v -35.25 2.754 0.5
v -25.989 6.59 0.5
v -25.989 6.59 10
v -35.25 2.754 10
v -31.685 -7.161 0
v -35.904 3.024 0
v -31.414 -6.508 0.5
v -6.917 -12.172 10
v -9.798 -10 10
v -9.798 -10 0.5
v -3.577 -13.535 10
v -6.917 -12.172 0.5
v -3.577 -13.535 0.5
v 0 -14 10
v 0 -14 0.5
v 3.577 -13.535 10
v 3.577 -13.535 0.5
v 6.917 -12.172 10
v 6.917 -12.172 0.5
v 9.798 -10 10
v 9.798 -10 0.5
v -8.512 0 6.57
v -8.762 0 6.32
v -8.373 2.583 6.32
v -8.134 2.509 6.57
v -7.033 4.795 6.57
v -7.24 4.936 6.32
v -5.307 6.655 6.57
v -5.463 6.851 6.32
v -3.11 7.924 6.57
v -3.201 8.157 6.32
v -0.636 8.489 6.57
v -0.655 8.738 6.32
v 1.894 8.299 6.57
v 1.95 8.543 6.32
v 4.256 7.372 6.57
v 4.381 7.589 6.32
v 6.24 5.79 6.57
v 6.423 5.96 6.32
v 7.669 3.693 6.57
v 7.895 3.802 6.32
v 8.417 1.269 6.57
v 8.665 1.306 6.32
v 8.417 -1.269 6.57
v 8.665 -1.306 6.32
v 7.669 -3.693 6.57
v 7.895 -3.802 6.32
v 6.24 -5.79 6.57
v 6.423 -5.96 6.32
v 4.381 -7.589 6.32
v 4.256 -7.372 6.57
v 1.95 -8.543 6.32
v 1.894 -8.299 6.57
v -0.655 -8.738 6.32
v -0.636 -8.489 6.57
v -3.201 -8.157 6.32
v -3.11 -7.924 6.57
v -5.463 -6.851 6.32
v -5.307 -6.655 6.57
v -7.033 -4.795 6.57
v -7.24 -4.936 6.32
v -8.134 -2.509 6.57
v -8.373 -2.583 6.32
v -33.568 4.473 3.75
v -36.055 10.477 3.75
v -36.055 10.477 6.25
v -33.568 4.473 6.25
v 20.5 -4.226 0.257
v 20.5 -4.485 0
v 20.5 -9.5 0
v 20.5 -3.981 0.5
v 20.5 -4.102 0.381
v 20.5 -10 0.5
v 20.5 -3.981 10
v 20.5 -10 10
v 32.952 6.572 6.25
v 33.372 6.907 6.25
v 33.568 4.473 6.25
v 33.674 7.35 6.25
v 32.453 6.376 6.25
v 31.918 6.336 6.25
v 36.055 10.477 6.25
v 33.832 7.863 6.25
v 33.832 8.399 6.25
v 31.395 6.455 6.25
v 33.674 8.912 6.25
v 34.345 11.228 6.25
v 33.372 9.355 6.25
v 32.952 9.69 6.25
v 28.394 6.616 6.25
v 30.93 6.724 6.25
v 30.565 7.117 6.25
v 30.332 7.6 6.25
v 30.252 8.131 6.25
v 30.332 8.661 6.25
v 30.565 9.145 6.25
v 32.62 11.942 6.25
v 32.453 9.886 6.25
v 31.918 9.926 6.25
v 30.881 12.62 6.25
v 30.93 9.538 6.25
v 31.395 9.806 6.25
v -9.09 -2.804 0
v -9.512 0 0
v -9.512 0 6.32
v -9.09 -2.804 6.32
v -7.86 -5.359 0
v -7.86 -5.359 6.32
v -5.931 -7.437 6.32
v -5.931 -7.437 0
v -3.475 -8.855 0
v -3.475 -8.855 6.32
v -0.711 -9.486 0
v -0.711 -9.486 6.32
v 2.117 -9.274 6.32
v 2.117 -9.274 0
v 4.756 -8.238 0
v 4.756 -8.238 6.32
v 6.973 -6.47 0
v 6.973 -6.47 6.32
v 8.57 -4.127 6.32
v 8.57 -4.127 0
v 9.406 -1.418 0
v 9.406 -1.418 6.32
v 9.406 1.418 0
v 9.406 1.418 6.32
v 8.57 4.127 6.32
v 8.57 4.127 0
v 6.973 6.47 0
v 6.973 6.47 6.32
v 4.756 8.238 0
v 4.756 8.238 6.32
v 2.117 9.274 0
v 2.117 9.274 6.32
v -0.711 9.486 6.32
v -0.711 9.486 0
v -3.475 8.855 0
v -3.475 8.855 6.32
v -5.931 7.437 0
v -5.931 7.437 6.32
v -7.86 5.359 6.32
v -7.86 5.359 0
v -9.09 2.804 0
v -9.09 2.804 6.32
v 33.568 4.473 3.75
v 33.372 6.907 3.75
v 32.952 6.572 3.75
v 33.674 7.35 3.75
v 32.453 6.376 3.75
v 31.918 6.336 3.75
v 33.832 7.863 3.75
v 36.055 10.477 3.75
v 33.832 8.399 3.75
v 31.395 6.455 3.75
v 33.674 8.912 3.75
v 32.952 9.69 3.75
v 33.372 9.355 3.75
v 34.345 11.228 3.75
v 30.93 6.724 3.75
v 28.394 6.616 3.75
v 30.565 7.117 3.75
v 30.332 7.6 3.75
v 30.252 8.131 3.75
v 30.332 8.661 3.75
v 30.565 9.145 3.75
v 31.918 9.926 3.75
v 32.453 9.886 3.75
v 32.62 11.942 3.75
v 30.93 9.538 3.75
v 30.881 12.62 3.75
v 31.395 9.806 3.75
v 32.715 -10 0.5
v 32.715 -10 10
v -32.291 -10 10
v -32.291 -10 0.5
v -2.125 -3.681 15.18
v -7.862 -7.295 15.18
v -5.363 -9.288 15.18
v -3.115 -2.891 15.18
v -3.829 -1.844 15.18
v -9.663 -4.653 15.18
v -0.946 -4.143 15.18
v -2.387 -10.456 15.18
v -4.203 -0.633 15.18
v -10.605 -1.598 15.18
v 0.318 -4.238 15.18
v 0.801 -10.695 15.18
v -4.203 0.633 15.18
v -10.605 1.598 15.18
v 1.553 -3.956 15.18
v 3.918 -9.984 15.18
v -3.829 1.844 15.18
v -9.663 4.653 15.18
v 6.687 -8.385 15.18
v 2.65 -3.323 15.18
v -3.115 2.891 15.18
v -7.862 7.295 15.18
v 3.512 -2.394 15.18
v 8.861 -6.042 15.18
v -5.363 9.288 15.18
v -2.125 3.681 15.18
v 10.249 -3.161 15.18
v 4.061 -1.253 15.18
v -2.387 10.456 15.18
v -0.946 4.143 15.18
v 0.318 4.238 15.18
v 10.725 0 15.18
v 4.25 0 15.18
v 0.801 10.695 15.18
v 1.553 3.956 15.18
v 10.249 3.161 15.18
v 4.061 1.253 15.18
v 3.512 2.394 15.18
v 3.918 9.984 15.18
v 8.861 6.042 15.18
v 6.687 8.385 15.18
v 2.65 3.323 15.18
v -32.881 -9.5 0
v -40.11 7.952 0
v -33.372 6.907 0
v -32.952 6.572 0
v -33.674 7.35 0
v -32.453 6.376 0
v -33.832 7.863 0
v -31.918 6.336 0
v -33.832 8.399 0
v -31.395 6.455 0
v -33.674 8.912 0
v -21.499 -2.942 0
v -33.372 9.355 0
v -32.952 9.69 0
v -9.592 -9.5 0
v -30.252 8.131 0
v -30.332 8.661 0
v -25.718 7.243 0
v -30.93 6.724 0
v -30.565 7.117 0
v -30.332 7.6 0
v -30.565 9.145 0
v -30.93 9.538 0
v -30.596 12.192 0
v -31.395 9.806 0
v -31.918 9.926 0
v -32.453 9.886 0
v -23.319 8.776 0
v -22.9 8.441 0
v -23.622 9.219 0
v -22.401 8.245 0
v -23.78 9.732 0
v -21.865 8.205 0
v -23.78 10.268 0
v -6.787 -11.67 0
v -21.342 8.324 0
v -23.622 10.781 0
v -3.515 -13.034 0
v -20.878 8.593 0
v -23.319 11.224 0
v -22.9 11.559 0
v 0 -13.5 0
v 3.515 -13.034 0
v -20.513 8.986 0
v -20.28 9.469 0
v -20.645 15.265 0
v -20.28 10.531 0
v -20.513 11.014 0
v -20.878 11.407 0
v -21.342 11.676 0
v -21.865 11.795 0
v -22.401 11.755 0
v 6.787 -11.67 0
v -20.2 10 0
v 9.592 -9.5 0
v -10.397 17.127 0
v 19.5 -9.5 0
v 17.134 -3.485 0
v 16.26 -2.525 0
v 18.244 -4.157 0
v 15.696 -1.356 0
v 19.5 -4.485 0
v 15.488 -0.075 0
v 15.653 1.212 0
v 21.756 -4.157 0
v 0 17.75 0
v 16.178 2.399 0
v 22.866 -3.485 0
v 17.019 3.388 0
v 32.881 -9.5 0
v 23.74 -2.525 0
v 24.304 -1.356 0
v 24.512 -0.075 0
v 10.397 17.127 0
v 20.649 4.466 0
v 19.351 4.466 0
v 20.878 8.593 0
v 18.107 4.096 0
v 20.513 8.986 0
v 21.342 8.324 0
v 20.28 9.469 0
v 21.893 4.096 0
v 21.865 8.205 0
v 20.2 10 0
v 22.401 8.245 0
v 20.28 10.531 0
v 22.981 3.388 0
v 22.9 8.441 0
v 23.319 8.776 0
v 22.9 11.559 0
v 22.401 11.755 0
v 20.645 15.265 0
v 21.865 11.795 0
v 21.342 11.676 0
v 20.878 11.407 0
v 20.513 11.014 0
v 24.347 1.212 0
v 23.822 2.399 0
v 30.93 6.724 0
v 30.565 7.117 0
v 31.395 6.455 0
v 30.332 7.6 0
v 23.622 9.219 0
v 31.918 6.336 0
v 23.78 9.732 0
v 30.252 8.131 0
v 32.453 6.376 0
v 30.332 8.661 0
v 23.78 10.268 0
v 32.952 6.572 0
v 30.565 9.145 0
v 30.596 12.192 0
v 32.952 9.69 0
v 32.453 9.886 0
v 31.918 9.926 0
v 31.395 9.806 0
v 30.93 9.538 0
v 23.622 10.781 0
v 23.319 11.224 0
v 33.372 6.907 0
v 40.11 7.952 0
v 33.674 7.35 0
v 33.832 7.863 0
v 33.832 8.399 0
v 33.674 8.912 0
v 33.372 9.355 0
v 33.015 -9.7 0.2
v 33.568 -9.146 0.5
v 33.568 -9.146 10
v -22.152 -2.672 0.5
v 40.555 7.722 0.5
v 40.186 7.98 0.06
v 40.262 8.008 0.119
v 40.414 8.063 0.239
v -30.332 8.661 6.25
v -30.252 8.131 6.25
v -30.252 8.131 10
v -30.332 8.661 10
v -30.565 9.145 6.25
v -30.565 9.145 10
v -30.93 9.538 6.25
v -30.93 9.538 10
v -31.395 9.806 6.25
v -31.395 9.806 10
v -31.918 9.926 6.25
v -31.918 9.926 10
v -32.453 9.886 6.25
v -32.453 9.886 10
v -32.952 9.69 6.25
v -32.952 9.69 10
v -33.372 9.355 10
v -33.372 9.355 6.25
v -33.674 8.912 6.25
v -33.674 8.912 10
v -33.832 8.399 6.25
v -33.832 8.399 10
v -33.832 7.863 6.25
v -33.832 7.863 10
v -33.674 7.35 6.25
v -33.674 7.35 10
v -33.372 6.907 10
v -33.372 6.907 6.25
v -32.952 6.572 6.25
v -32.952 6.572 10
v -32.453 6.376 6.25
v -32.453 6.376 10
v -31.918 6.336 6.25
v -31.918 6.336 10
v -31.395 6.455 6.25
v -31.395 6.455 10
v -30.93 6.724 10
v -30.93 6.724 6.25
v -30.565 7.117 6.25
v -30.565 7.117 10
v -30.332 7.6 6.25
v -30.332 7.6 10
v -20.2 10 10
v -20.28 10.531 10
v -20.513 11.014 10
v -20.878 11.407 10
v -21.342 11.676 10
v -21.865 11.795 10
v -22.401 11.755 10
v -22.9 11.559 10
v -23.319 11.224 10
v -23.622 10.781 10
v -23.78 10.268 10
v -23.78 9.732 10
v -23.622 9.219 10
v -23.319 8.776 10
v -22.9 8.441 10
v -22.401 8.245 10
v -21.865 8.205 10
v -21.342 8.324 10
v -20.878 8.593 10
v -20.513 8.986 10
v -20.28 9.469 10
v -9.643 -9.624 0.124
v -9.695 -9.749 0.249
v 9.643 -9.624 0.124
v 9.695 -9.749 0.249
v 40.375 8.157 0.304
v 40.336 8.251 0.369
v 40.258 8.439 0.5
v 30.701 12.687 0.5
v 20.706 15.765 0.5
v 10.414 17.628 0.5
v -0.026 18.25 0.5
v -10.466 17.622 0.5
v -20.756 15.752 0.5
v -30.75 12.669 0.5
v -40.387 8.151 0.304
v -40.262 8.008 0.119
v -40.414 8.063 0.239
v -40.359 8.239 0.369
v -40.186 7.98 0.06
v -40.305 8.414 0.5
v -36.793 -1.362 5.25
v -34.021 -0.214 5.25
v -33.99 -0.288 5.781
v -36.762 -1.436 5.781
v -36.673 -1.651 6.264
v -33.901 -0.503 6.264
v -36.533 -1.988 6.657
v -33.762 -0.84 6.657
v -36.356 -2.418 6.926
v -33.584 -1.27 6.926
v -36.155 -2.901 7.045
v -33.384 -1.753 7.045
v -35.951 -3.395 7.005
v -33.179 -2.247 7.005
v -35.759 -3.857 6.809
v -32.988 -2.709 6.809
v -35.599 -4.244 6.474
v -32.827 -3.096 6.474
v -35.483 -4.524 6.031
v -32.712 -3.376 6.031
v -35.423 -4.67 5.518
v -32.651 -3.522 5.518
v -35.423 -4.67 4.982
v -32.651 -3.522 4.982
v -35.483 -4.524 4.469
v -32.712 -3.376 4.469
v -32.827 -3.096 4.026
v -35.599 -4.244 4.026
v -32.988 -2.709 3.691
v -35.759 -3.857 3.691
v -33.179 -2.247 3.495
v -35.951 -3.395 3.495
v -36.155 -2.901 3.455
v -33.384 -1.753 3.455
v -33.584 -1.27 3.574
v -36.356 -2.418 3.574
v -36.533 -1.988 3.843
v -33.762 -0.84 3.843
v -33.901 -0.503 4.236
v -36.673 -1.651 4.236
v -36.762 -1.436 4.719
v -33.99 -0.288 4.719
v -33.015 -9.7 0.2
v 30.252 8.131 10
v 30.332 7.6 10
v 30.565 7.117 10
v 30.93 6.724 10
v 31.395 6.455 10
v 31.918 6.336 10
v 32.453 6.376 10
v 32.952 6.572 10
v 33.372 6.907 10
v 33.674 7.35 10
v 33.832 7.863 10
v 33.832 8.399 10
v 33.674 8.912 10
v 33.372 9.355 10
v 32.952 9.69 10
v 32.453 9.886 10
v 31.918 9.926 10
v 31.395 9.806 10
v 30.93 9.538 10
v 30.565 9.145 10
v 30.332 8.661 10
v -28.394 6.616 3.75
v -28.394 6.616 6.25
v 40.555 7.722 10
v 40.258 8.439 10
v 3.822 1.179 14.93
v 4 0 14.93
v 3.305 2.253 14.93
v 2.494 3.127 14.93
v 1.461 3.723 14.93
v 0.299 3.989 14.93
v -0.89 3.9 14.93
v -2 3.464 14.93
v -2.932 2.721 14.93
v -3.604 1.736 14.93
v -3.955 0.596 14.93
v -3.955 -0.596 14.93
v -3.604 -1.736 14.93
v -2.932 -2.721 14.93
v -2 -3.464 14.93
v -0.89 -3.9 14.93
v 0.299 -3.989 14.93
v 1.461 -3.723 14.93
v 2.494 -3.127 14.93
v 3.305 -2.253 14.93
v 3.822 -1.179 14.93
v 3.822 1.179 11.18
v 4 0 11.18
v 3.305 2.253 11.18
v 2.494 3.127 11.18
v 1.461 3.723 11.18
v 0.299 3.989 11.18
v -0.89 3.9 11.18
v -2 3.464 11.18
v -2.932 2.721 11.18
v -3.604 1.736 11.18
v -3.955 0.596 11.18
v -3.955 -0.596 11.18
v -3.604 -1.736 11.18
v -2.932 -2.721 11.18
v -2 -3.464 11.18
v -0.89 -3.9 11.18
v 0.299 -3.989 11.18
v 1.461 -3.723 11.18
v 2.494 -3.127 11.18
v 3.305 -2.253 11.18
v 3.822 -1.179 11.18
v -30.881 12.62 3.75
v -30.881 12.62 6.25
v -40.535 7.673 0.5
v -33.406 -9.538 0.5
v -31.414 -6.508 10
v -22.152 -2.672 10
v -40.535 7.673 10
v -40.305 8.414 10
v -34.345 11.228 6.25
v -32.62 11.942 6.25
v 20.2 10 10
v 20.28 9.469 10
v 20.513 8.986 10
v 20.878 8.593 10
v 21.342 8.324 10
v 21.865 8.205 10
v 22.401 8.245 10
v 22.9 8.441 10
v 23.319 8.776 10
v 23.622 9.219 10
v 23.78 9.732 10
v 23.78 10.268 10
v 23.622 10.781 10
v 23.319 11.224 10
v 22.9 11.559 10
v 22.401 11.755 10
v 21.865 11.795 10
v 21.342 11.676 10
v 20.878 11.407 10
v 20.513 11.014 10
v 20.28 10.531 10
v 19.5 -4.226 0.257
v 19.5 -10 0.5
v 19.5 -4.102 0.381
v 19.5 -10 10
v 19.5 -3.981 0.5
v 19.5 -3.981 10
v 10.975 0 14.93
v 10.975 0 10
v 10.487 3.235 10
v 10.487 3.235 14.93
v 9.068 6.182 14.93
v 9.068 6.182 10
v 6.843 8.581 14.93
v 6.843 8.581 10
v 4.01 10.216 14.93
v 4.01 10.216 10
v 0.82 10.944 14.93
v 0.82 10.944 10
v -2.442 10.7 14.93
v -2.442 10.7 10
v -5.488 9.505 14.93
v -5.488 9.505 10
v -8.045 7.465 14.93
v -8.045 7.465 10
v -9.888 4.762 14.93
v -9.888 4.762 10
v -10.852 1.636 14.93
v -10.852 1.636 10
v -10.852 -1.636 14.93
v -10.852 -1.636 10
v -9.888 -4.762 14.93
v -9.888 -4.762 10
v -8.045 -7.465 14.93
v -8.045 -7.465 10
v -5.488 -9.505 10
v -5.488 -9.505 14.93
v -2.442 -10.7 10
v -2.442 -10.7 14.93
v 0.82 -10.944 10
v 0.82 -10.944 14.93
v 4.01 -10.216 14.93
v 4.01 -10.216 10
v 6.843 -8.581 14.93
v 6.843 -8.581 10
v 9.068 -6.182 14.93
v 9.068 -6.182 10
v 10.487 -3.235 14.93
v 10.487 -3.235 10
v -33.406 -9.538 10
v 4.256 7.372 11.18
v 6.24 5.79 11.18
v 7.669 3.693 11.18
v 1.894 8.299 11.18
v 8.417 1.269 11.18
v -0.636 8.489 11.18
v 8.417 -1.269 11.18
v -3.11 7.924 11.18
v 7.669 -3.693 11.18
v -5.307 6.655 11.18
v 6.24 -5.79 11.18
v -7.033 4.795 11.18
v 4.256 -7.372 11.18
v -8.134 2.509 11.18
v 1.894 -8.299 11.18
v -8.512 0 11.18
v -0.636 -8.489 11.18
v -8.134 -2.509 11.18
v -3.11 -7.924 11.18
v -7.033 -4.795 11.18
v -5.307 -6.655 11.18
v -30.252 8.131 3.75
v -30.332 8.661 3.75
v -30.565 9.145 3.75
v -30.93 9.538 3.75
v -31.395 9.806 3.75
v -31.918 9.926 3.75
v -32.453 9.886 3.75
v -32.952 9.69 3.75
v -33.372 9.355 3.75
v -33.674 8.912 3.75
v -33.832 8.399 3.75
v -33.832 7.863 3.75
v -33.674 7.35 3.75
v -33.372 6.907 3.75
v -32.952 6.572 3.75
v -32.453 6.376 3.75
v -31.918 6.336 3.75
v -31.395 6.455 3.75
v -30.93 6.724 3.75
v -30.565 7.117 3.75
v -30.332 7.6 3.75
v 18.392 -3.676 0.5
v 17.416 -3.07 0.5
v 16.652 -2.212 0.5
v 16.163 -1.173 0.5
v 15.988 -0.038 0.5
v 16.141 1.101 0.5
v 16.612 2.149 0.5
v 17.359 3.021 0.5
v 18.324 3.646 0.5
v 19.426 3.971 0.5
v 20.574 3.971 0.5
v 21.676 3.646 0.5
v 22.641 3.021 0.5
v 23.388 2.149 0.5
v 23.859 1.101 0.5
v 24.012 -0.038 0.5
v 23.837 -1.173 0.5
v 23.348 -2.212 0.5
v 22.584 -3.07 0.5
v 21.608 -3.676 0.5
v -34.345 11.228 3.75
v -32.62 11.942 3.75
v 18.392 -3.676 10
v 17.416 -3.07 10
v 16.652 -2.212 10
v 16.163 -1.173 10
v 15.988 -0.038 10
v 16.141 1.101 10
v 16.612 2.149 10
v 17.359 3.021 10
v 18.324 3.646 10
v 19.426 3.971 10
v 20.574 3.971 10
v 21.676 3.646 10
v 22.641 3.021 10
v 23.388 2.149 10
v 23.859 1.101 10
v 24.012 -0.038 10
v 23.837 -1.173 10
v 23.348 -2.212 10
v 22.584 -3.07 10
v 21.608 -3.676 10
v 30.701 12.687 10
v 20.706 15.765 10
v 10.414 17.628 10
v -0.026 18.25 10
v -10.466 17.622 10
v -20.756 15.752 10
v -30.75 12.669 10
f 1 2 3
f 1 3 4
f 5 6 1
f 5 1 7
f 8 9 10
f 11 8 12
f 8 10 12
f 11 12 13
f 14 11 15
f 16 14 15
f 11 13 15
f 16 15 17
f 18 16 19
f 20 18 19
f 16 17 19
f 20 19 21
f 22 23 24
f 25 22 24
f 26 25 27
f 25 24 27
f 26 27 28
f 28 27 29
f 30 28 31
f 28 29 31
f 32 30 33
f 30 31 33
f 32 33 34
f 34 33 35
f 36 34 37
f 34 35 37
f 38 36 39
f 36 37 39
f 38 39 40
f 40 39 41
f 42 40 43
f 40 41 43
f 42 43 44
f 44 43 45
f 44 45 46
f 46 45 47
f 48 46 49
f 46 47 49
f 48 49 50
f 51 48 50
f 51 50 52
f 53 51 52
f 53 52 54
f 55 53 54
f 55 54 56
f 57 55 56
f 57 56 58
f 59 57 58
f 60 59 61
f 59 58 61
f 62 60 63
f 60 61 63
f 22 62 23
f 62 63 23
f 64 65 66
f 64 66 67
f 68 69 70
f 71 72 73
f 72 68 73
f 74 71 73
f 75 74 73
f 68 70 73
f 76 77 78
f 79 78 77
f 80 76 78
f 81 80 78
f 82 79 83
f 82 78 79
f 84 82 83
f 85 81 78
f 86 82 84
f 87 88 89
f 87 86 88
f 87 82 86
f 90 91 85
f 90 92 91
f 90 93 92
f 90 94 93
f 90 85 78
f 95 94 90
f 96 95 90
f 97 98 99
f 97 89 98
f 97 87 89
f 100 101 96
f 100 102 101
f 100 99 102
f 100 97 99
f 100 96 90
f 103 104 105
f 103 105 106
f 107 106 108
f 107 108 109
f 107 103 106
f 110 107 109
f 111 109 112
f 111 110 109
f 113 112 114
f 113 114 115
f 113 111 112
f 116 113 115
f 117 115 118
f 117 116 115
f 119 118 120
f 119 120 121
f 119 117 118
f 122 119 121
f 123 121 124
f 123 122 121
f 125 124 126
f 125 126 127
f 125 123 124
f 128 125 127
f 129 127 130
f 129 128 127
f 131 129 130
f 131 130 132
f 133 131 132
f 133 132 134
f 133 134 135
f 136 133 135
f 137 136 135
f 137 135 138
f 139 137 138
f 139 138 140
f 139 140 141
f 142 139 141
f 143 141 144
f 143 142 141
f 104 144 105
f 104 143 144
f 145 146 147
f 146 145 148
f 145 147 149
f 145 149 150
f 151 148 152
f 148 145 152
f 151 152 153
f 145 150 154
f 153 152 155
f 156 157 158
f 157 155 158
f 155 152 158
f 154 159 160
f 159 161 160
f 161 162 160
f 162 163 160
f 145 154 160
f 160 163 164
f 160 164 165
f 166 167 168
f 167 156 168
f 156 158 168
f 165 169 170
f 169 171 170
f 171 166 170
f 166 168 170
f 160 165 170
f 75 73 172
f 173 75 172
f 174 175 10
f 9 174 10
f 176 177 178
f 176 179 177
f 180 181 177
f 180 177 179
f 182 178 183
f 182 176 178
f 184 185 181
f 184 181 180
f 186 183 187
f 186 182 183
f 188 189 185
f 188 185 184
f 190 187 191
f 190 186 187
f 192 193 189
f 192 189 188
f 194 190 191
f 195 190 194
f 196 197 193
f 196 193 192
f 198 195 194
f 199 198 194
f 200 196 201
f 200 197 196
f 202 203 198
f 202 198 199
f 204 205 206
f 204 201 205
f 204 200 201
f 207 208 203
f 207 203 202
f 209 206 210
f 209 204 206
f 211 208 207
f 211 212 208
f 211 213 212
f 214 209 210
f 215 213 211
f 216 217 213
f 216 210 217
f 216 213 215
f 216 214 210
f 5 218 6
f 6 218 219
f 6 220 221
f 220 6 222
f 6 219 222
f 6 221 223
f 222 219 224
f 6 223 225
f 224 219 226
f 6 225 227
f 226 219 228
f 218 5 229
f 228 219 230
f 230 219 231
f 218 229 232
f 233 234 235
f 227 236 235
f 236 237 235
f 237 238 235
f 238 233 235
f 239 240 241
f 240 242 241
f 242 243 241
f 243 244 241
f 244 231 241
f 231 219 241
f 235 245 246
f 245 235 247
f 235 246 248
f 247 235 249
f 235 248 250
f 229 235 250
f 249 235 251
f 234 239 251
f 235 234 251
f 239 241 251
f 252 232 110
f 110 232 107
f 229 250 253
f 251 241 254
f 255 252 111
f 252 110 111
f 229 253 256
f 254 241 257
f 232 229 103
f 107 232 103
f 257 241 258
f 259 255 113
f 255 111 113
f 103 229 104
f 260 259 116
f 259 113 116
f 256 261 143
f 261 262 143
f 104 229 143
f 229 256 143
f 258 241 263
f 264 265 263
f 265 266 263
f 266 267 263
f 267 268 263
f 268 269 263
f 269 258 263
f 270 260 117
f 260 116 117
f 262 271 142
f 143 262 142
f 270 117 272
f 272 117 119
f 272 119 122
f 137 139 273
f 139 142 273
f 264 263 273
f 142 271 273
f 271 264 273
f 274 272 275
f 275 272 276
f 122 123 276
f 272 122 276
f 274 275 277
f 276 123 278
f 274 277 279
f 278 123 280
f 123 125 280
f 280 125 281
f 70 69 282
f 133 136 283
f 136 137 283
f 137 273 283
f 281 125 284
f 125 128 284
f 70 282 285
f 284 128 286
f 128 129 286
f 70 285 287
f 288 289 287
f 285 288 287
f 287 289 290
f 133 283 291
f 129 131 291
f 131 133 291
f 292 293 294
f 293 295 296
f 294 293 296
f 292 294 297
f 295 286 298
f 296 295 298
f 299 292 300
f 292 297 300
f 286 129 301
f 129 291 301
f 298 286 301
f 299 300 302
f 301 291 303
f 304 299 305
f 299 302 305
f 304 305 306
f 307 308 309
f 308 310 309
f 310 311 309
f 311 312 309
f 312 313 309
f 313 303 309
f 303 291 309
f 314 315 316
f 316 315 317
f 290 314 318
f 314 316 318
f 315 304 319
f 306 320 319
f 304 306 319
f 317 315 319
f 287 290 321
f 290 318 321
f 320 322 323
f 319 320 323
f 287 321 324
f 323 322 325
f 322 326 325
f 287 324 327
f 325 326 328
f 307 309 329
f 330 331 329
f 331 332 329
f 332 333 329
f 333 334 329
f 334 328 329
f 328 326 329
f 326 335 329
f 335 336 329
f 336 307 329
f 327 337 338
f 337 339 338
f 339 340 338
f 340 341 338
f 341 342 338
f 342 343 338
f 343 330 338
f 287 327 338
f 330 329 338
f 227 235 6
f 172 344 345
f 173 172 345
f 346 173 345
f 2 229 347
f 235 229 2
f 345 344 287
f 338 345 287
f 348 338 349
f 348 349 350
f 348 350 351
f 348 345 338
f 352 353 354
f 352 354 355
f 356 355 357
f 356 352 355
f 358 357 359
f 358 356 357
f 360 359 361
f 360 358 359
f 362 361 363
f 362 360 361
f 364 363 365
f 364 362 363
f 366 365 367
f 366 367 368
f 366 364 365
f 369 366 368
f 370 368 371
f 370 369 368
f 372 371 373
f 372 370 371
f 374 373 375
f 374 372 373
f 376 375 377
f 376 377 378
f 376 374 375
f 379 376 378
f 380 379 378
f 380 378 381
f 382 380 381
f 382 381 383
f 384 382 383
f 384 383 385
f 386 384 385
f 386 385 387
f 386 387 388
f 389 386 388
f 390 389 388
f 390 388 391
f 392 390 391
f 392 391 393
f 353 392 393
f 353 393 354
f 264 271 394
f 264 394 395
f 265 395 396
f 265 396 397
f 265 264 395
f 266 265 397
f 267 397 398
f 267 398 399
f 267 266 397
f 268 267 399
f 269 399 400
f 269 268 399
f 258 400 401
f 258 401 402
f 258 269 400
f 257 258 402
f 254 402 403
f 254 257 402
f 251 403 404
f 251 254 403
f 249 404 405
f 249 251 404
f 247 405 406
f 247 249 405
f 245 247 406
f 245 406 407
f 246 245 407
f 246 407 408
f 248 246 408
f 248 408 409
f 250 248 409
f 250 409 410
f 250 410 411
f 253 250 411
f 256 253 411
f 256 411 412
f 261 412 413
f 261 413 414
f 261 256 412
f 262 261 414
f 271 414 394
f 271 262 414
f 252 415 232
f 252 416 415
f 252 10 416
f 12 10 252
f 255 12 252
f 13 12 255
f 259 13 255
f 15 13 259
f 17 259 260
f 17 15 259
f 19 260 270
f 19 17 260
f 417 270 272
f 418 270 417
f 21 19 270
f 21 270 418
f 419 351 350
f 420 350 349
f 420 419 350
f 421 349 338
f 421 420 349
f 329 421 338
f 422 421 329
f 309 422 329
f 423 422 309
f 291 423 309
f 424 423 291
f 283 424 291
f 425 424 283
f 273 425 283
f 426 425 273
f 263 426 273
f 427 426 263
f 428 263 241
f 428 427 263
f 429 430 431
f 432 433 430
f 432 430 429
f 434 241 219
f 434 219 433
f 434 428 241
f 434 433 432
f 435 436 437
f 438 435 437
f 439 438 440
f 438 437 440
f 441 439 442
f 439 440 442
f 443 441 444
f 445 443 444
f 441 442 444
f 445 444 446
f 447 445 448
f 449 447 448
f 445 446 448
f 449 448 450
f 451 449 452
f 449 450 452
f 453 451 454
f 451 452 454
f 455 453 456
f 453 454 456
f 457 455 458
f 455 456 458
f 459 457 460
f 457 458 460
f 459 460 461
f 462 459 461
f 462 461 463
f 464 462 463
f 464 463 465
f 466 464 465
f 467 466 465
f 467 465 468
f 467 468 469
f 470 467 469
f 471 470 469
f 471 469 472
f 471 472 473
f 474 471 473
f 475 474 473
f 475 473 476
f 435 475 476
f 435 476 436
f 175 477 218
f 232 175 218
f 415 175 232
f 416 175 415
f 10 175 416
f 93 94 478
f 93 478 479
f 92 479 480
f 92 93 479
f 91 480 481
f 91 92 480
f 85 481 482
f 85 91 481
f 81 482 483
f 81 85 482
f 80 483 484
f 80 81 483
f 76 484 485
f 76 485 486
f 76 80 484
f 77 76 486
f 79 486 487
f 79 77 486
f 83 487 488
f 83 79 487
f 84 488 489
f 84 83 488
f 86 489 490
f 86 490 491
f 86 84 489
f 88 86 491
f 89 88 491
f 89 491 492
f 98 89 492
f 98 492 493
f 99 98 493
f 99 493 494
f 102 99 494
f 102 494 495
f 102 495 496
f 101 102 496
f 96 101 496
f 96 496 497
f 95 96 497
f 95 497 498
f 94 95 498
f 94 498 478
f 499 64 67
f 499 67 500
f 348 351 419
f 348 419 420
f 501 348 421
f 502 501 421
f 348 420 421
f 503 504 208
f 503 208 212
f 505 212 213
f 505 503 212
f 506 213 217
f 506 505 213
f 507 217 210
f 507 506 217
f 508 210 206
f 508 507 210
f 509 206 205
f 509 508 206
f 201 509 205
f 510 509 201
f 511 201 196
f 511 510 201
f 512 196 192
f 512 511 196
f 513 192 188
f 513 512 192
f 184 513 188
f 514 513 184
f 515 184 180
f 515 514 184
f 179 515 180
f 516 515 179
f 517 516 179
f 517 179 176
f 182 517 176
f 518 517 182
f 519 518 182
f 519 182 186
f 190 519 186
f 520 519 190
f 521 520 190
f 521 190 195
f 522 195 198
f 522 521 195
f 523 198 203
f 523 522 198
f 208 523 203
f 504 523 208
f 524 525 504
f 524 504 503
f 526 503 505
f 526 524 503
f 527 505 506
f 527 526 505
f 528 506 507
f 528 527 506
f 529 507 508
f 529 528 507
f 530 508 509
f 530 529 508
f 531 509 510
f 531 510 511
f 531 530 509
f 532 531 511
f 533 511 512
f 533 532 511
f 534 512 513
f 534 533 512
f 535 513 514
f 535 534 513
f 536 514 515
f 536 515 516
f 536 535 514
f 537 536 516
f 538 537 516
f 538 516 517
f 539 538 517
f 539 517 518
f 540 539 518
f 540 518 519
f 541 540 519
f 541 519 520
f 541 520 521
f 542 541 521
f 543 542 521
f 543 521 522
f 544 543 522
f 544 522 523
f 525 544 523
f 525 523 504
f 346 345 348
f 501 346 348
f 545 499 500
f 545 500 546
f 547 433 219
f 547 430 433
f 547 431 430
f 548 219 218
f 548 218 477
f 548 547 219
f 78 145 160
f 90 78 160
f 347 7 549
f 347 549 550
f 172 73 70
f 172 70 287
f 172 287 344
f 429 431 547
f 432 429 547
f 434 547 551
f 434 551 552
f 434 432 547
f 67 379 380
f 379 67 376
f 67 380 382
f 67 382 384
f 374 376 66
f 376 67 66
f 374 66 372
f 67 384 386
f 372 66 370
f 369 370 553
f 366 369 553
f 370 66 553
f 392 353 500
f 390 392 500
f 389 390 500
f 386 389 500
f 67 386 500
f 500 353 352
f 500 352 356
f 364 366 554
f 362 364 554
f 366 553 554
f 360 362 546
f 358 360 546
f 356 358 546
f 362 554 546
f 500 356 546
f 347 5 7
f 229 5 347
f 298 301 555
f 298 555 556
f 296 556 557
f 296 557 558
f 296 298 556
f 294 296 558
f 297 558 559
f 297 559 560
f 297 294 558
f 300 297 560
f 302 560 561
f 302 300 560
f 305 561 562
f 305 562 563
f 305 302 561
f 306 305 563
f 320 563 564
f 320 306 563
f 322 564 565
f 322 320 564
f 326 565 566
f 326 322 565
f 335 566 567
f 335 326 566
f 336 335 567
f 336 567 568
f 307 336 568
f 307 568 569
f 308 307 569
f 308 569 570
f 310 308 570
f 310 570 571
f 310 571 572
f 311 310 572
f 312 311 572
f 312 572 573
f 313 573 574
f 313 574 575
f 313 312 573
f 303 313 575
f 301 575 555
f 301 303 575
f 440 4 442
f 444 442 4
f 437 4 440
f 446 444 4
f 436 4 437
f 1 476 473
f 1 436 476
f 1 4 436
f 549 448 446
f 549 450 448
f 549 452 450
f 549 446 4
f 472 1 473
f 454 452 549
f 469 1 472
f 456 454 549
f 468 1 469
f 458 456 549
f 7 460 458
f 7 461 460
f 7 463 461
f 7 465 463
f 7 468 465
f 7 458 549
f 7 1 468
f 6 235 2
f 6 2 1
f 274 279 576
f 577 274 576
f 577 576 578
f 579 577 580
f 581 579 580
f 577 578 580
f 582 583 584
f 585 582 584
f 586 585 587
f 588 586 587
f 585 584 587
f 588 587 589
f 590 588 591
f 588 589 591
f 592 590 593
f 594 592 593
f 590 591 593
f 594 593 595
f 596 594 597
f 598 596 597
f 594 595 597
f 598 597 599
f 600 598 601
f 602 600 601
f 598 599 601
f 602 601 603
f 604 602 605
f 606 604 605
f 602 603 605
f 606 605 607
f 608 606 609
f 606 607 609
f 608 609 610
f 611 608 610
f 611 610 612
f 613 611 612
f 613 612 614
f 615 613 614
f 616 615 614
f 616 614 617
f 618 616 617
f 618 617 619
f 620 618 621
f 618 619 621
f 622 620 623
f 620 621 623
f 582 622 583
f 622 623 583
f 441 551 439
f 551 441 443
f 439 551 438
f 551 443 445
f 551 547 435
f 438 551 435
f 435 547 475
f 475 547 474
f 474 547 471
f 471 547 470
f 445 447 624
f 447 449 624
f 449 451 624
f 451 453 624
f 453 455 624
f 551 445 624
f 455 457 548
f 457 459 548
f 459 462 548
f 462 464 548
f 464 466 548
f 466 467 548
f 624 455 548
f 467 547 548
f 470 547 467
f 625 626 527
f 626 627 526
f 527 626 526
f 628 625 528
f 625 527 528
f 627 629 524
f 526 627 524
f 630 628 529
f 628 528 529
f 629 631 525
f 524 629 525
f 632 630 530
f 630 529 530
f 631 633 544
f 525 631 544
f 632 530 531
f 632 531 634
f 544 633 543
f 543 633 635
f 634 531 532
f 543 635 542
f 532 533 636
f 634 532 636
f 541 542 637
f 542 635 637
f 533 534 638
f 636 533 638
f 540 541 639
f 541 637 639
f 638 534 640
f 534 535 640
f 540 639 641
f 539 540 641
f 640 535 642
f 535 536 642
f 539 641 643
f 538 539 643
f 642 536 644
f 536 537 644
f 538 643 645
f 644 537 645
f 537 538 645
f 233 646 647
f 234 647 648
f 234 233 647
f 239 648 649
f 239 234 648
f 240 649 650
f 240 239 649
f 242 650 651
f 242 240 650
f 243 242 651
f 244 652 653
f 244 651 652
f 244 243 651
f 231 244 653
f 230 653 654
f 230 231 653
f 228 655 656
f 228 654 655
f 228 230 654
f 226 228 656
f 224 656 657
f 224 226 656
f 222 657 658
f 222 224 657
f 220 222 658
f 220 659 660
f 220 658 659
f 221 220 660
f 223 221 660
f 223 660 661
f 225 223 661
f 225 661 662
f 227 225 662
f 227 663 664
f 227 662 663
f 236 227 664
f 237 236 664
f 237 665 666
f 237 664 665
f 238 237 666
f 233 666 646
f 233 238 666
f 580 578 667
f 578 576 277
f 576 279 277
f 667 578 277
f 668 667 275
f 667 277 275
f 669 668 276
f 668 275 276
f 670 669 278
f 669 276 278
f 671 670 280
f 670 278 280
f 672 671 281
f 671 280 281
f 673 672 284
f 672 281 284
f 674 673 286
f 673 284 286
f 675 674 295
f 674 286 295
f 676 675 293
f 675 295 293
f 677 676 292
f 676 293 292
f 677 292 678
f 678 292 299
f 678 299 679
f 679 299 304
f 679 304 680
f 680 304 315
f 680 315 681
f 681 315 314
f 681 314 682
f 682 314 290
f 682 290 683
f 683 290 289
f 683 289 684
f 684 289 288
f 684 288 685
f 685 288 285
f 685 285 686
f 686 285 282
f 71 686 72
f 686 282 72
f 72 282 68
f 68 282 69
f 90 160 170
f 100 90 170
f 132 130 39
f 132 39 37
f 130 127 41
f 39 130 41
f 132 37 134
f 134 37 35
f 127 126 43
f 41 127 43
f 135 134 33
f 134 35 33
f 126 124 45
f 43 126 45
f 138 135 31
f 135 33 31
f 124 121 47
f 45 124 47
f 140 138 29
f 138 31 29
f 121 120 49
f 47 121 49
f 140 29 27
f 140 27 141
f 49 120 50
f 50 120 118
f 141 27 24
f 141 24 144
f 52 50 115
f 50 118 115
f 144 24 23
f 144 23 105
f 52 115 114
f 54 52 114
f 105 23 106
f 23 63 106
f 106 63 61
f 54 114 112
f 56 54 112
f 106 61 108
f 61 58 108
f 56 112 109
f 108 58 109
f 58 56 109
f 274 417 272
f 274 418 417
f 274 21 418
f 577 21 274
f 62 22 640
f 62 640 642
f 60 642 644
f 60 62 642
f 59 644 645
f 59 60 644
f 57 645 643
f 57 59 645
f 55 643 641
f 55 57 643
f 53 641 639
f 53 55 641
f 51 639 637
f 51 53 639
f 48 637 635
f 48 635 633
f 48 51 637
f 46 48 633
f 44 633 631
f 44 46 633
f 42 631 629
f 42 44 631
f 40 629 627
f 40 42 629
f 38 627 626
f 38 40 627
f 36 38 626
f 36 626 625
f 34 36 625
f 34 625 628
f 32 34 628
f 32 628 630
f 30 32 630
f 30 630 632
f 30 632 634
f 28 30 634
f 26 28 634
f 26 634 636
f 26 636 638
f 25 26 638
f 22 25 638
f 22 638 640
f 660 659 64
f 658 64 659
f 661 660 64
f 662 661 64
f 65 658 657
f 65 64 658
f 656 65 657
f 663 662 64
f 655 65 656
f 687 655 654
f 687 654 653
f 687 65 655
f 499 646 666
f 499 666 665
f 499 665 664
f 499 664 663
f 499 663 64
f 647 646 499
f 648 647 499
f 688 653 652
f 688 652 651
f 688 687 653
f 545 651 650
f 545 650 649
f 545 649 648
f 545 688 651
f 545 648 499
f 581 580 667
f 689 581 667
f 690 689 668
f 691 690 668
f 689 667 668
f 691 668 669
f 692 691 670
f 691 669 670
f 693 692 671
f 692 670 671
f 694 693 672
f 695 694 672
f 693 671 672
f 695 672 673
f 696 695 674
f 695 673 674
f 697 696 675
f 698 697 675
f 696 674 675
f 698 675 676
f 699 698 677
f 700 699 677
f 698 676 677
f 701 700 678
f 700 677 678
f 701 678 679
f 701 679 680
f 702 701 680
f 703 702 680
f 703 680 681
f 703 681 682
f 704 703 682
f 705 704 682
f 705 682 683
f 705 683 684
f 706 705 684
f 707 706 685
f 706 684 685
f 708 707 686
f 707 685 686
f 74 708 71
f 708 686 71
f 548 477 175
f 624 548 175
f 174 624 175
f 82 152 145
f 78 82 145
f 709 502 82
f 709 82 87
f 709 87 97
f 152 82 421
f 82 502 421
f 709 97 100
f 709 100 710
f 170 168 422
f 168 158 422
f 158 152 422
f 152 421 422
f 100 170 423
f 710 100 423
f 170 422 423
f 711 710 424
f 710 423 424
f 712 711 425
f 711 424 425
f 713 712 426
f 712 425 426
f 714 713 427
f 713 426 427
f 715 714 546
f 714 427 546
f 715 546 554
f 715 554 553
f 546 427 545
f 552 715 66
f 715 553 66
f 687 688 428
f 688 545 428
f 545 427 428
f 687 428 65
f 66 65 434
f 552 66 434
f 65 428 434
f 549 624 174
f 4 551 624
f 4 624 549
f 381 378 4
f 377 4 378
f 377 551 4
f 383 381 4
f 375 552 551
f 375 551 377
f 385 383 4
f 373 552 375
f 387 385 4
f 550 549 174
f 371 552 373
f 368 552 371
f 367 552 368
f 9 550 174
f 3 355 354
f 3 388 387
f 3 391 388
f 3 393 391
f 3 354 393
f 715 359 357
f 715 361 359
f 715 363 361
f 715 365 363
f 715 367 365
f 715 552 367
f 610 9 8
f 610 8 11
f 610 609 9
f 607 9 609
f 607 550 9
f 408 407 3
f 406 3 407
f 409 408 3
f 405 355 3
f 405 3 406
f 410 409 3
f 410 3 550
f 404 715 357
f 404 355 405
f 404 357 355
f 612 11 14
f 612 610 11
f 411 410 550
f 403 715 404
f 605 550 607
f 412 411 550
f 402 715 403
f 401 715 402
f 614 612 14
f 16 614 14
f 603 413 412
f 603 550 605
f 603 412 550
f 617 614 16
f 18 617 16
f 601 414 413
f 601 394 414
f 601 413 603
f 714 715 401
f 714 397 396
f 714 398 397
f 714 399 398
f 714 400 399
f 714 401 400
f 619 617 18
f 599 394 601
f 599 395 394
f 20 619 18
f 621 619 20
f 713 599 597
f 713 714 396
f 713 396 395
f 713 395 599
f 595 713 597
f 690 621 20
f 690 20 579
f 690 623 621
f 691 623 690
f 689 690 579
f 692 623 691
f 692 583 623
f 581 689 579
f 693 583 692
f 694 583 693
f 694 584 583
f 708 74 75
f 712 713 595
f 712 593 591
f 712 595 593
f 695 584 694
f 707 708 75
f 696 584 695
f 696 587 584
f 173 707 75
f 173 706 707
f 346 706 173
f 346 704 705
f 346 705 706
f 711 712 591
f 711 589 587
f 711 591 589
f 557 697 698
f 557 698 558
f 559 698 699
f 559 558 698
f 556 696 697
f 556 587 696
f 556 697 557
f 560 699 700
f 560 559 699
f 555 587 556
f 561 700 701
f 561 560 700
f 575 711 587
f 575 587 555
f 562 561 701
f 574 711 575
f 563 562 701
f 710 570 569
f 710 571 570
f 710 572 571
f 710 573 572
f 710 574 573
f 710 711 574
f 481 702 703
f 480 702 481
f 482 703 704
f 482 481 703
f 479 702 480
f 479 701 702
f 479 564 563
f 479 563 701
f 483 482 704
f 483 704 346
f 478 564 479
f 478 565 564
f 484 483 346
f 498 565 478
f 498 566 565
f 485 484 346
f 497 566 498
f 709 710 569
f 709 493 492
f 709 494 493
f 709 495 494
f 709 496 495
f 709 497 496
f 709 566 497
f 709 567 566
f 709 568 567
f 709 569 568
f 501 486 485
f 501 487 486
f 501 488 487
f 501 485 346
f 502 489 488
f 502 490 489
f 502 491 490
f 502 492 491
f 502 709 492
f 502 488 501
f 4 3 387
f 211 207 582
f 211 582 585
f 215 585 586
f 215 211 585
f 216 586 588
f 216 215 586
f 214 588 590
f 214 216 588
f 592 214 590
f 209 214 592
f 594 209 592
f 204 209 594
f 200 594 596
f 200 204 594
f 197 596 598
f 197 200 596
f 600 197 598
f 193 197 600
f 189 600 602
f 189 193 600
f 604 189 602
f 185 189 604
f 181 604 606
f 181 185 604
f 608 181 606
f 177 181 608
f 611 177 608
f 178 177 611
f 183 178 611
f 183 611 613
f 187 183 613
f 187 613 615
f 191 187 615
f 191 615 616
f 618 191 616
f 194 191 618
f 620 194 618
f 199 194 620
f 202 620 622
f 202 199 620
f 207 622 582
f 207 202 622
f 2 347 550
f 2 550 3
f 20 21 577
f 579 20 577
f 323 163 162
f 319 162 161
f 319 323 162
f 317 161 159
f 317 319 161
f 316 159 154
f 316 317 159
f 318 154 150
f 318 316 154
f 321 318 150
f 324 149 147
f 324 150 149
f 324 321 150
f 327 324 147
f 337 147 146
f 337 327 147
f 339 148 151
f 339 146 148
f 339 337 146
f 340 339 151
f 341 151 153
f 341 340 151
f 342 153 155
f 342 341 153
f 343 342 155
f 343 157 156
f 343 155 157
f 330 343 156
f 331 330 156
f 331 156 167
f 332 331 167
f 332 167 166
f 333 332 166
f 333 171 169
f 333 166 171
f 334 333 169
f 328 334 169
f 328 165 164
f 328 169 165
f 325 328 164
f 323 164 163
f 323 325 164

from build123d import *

# Parameters (mm, degrees)
SKETCH1_R           = 5
SKETCH1_R_2         = 1.8
BOSS_EXTRUDE1_DEPTH = 10
CHAMFER1_SIZE       = 0.5
CUT_EXTRUDE2_DEPTH  = 2.5
CHAMFER2_SIZE       = 0.5
SKETCH4_R           = 1.8
CUT_EXTRUDE3_DEPTH  = 10
CHAMFER3_SIZE       = 0.5
CHAMFER3_SIZE_2     = 0.923879533
CHAMFER3_SIZE_3     = 0.552958444
SKETCH7_R           = 10.975
SKETCH7_R_2         = 4
BOSS_EXTRUDE2_DEPTH = 5.18
SKETCH8_R           = 8.5125
CUT_EXTRUDE6_DEPTH  = 11.18
SKETCH9_R           = 9.5125
CUT_EXTRUDE8_DEPTH  = 6.32
CHAMFER4_SIZE       = 0.25


with BuildPart() as part:
    # Sketch1 → Boss-Extrude1 (new body)
    with BuildSketch(Plane.XY):
        with BuildLine():
            Line((-40.746699048, 8.183561953), (-33.214821075, -10))
            Line((-33.214821075, -10), (-9.797958971, -10))
            ThreePointArc((-9.797958971, -10), (0, -14), (9.797958971, -10))
            Line((9.797958971, -10), (19.5, -10))
            Line((19.5, -10), (19.5, -3.981225471))
            ThreePointArc((19.5, -3.981225471), (20, 4.0125), (20.5, -3.981225471))
            Line((20.5, -3.981225471), (20.5, -10))
            Line((20.5, -10), (33.214821075, -10))
            Line((33.214821075, -10), (40.746699048, 8.183561953))
            ThreePointArc((40.746699048, 8.183561953), (0, 18.25), (-40.746699048, 8.183561953))
        make_face()
        Circle(SKETCH1_R, mode=Mode.SUBTRACT)
        with Locations((-32.052211881, 8.130884627)):
            Circle(SKETCH1_R_2, mode=Mode.SUBTRACT)
        with Locations(Location((32.052211881, 8.130884627, 0), (0, 0, 180))):
            Circle(SKETCH1_R_2, mode=Mode.SUBTRACT)
        with Locations((-22, 10)):
            Circle(SKETCH1_R_2, mode=Mode.SUBTRACT)
        with Locations(Location((22, 10, 0), (0, 0, 180))):
            Circle(SKETCH1_R_2, mode=Mode.SUBTRACT)
        Polygon((-25.988511975, 6.5901118), (-35.250404289, 2.75371039), (-31.414002879, -6.508181923), (-22.152110566, -2.671780514), align=None, mode=Mode.SUBTRACT)
    extrude(amount=BOSS_EXTRUDE1_DEPTH)

    # Chamfer1
    chamfer1_edges = [part.edges().sort_by_distance(p)[0] for p in [
        (20, 4.0125, 0),
        (-24.070311271, 1.959165643, 0),
        (-30.619458132, 4.671911095, 0),
        (-33.332203584, -1.877235766, 0),
        (-26.783056723, -4.589981218, 0),
    ]]
    chamfer(chamfer1_edges, length=CHAMFER1_SIZE)

    # Sketch3 → Cut-Extrude2 (cut)
    with BuildSketch(Plane.XY.offset(3.75)):
        Polygon((-37.076762037, 12.944469155), (-33.567560961, 4.472508325), (-28.393835579, 6.615535546), (-31.903036655, 15.087496376), align=None)
        Polygon((37.076762037, 12.944469155), (33.567560961, 4.472508325), (28.393835579, 6.615535546), (31.903036655, 15.087496376), align=None)
    extrude(amount=CUT_EXTRUDE2_DEPTH, mode=Mode.SUBTRACT)

    # Chamfer2
    chamfer2_edges = [part.edges().sort_by_distance(p)[0] for p in [
        (14.648979486, -10, 0),
        (0, -14, 0),
        (-21.506390023, -10, 0),
        (-36.980760062, -0.908219024, 0),
        (0, 18.25, 0),
        (36.980760062, -0.908219024, 0),
        (26.857410538, -10, 0),
    ]]
    chamfer(chamfer2_edges, length=CHAMFER2_SIZE)

    # Sketch4 → Cut-Extrude3 (cut)
    with BuildSketch(Plane(origin=(-29.114518455, -12.059628406, 0), x_dir=(0, 0, -1), z_dir=(0.9238795325112882, 0.38268343236508634, 0))):
        with Locations(Location((-5.25, 11.021342374, 0), (0, 0, 90))):
            Circle(SKETCH4_R)
    extrude(amount=-CUT_EXTRUDE3_DEPTH, mode=Mode.SUBTRACT)

    # Chamfer3
    # the kernel refuses this chamfer: 0.923879533, 0.552958444, 0.5 mm, written as the material it takes off along each edge
    with BuildSketch(Plane(origin=(40.746699048, 8.183561953, -0.920037939), x_dir=(-0.38268343236508906, -0.923879532511287, 0), z_dir=(0, 0, 1))) as chamfer3_piece_1:
        with BuildLine():
            Line((CHAMFER3_SIZE, 0), (-0.048717445, -0.548717445))
            ThreePointArc((-0.048717445, -0.548717445), (-0.025540103, -0.282767493), (0, 0))
            Line((0, 0), (CHAMFER3_SIZE, 0))
        make_face()
    extrude(amount=12.340075878, mode=Mode.SUBTRACT)
    with BuildSketch(Plane(origin=(33.214821075, -10, -1.895315111), x_dir=(-1, 0, 0), z_dir=(0, 0, 1)), Plane(origin=(-33.214821075, -10, -1.895315111), x_dir=(-0.38268343236508656, 0.9238795325112881, 0), z_dir=(0, 0, 1))) as chamfer3_piece_2:
        Polygon((CHAMFER3_SIZE, 0), (-CHAMFER3_SIZE_2 * 0.382683432163, -CHAMFER3_SIZE_2 * 0.923879532023), (0, 0), align=None)
    extrude(amount=14.290630221, mode=Mode.SUBTRACT)
    with BuildSketch(Plane(origin=(-40.746699048, 8.183561953, -0.925350902), x_dir=(0.38268343236508684, -0.9238795325112881, 0), z_dir=(0, 0, 1))) as chamfer3_piece_3:
        with BuildLine():
            Line((CHAMFER3_SIZE_3, 0), (-0.04424113, 0.496614821))
            ThreePointArc((-0.04424113, 0.496614821), (-0.0231658, 0.256042208), (0, 0))
            Line((0, 0), (CHAMFER3_SIZE_3, 0))
        make_face()
    extrude(amount=12.350701805, mode=Mode.SUBTRACT)

    # Sketch7 → Boss-Extrude2 (add)
    with BuildSketch(Plane.XY.offset(10)):
        Circle(SKETCH7_R)
        Circle(SKETCH7_R_2, mode=Mode.SUBTRACT)
    extrude(amount=BOSS_EXTRUDE2_DEPTH)

    # Sketch8 → Cut-Extrude6 (cut)
    with BuildSketch(Plane.XY):
        with Locations(Location((0, 0, 0), (0, 0, 180))):
            Circle(SKETCH8_R)
    extrude(amount=CUT_EXTRUDE6_DEPTH, mode=Mode.SUBTRACT)

    # Sketch9 → Cut-Extrude8 (cut)
    with BuildSketch(Plane.XY):
        with Locations(Location((0, 0, 0), (0, 0, 180))):
            Circle(SKETCH9_R)
    extrude(amount=CUT_EXTRUDE8_DEPTH, mode=Mode.SUBTRACT)

    # Chamfer4
    chamfer4_edges = [part.edges().sort_by_distance(p)[0] for p in [
        (-10.975, 0, 15.18),
        (-4, 0, 15.18),
        (8.5125, 0, 6.32),
    ]]
    chamfer(chamfer4_edges, length=CHAMFER4_SIZE)


solid = part.part
